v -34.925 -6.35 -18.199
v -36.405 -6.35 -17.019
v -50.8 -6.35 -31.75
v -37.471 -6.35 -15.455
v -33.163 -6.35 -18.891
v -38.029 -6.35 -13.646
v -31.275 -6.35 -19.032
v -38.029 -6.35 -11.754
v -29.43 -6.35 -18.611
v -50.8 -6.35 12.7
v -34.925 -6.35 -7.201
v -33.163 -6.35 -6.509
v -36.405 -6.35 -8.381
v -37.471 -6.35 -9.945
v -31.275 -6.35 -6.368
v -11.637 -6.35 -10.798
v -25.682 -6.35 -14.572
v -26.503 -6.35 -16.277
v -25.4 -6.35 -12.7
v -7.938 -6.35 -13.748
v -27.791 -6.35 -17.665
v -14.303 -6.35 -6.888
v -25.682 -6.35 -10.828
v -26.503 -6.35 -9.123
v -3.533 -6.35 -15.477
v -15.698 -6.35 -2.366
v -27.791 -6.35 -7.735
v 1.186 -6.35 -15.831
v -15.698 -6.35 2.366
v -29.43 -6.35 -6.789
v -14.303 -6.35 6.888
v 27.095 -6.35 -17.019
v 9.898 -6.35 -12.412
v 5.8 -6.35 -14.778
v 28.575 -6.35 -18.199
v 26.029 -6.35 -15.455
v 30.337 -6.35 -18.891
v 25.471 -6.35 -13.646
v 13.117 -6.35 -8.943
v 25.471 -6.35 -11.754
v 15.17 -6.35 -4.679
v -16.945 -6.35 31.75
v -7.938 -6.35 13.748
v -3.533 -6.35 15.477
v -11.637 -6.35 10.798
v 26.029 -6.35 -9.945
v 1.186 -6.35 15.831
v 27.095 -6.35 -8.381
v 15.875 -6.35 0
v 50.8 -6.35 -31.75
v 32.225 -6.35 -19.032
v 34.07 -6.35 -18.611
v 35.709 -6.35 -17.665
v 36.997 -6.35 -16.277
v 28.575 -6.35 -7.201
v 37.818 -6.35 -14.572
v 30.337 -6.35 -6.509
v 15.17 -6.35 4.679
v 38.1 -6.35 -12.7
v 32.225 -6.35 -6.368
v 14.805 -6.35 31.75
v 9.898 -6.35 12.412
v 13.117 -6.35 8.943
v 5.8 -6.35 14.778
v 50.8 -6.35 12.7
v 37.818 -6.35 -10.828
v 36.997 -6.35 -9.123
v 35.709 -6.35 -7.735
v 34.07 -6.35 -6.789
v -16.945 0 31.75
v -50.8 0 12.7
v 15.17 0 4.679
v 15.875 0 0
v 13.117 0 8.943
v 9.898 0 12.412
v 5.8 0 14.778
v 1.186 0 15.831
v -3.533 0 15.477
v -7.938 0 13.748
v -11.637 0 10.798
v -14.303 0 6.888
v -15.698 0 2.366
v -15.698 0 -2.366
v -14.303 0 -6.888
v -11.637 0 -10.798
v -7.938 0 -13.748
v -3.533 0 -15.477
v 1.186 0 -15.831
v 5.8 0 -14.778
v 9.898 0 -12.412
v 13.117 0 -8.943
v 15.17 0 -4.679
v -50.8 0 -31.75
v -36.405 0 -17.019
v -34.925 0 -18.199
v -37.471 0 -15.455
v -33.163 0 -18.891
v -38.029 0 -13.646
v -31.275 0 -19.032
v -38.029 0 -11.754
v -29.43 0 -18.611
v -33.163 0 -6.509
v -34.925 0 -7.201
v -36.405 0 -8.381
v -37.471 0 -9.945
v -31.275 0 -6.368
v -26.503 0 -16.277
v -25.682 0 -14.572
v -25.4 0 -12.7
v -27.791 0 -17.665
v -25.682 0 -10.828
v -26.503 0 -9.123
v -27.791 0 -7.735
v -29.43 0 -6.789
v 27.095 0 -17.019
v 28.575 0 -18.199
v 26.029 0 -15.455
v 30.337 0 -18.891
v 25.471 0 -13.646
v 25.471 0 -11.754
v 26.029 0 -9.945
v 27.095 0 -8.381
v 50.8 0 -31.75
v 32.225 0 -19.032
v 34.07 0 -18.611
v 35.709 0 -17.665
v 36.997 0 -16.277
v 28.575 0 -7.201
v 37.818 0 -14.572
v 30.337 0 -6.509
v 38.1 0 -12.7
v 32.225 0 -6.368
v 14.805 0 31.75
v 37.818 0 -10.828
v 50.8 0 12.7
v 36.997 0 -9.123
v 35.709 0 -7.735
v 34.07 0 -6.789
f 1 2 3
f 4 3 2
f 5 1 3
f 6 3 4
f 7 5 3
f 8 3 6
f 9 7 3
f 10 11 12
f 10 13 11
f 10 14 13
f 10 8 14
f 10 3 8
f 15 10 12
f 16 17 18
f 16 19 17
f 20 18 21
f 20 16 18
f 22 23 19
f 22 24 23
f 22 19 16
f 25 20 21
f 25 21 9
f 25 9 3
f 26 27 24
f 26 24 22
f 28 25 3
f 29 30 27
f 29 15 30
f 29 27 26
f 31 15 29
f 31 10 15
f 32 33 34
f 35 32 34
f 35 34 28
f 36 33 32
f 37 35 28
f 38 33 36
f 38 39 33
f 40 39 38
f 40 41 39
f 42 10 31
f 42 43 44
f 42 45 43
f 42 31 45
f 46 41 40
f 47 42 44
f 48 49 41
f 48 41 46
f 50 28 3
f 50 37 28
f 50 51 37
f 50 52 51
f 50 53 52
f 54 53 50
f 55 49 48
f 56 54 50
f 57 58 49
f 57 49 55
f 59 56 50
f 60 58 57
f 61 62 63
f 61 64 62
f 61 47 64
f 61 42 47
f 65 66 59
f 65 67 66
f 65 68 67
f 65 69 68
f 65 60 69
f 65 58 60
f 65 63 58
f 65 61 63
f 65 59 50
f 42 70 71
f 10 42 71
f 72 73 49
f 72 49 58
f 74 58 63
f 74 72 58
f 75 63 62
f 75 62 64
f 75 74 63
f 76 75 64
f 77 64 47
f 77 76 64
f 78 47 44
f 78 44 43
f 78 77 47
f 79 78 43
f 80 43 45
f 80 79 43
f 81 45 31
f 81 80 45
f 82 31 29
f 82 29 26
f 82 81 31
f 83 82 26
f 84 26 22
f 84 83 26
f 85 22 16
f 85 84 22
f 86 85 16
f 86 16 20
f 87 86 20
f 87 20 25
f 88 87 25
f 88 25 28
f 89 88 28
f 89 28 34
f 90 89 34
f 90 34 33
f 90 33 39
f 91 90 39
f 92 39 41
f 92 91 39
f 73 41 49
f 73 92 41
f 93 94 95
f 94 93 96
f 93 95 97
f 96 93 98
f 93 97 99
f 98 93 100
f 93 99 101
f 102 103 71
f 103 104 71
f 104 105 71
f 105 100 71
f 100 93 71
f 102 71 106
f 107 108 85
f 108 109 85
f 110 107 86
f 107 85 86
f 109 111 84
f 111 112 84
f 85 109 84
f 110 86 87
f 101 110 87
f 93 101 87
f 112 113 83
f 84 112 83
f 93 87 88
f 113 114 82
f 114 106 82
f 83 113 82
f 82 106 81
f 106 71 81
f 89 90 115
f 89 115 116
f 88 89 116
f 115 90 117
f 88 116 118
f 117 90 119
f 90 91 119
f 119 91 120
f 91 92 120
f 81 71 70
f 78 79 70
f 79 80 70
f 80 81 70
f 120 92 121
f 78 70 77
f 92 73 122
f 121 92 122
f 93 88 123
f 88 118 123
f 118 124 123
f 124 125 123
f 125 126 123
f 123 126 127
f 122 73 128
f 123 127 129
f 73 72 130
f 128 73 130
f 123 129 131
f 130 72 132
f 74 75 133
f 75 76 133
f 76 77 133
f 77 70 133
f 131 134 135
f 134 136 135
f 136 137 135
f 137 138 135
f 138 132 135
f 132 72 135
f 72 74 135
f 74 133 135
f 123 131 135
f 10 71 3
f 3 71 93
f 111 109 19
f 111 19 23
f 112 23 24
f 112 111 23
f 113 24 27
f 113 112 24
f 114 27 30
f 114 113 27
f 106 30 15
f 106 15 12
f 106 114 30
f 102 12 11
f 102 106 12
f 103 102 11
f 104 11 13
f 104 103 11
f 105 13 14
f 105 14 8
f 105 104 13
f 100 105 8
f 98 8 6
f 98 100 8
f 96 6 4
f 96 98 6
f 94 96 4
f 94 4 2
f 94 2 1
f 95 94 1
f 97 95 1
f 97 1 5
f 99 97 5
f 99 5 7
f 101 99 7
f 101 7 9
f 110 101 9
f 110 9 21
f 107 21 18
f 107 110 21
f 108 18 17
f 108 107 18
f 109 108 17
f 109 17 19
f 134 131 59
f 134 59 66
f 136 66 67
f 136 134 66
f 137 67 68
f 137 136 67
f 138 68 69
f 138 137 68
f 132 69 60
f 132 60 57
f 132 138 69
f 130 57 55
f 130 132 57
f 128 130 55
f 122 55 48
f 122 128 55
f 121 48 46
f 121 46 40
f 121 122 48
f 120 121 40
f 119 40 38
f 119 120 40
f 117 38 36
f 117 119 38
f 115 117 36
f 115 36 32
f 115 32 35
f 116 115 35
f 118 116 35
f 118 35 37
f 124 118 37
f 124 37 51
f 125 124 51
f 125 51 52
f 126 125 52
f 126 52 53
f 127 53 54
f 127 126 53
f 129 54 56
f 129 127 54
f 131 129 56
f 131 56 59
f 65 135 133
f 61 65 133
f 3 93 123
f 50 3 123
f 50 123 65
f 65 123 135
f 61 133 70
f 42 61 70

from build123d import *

# Parameters (mm, degrees)
F0_R     = 6.35
F0_R_2   = 15.875
F1_DEPTH = 6.35


with BuildPart() as f1:
    # F0 (on Front) → F1 (new body)
    with BuildSketch(Plane.XZ):
        Polygon((50.8, -31.75), (50.8, 12.7), (14.804928, 31.75), (-16.945072, 31.75), (-50.8, 12.7), (-50.8, -31.75), align=None)
        with Locations((-31.75, -12.7)):
            Circle(F0_R, mode=Mode.SUBTRACT)
        with Locations((31.75, -12.7)):
            Circle(F0_R, mode=Mode.SUBTRACT)
        Circle(F0_R_2, mode=Mode.SUBTRACT)
    extrude(amount=F1_DEPTH)


solid = f1.part
